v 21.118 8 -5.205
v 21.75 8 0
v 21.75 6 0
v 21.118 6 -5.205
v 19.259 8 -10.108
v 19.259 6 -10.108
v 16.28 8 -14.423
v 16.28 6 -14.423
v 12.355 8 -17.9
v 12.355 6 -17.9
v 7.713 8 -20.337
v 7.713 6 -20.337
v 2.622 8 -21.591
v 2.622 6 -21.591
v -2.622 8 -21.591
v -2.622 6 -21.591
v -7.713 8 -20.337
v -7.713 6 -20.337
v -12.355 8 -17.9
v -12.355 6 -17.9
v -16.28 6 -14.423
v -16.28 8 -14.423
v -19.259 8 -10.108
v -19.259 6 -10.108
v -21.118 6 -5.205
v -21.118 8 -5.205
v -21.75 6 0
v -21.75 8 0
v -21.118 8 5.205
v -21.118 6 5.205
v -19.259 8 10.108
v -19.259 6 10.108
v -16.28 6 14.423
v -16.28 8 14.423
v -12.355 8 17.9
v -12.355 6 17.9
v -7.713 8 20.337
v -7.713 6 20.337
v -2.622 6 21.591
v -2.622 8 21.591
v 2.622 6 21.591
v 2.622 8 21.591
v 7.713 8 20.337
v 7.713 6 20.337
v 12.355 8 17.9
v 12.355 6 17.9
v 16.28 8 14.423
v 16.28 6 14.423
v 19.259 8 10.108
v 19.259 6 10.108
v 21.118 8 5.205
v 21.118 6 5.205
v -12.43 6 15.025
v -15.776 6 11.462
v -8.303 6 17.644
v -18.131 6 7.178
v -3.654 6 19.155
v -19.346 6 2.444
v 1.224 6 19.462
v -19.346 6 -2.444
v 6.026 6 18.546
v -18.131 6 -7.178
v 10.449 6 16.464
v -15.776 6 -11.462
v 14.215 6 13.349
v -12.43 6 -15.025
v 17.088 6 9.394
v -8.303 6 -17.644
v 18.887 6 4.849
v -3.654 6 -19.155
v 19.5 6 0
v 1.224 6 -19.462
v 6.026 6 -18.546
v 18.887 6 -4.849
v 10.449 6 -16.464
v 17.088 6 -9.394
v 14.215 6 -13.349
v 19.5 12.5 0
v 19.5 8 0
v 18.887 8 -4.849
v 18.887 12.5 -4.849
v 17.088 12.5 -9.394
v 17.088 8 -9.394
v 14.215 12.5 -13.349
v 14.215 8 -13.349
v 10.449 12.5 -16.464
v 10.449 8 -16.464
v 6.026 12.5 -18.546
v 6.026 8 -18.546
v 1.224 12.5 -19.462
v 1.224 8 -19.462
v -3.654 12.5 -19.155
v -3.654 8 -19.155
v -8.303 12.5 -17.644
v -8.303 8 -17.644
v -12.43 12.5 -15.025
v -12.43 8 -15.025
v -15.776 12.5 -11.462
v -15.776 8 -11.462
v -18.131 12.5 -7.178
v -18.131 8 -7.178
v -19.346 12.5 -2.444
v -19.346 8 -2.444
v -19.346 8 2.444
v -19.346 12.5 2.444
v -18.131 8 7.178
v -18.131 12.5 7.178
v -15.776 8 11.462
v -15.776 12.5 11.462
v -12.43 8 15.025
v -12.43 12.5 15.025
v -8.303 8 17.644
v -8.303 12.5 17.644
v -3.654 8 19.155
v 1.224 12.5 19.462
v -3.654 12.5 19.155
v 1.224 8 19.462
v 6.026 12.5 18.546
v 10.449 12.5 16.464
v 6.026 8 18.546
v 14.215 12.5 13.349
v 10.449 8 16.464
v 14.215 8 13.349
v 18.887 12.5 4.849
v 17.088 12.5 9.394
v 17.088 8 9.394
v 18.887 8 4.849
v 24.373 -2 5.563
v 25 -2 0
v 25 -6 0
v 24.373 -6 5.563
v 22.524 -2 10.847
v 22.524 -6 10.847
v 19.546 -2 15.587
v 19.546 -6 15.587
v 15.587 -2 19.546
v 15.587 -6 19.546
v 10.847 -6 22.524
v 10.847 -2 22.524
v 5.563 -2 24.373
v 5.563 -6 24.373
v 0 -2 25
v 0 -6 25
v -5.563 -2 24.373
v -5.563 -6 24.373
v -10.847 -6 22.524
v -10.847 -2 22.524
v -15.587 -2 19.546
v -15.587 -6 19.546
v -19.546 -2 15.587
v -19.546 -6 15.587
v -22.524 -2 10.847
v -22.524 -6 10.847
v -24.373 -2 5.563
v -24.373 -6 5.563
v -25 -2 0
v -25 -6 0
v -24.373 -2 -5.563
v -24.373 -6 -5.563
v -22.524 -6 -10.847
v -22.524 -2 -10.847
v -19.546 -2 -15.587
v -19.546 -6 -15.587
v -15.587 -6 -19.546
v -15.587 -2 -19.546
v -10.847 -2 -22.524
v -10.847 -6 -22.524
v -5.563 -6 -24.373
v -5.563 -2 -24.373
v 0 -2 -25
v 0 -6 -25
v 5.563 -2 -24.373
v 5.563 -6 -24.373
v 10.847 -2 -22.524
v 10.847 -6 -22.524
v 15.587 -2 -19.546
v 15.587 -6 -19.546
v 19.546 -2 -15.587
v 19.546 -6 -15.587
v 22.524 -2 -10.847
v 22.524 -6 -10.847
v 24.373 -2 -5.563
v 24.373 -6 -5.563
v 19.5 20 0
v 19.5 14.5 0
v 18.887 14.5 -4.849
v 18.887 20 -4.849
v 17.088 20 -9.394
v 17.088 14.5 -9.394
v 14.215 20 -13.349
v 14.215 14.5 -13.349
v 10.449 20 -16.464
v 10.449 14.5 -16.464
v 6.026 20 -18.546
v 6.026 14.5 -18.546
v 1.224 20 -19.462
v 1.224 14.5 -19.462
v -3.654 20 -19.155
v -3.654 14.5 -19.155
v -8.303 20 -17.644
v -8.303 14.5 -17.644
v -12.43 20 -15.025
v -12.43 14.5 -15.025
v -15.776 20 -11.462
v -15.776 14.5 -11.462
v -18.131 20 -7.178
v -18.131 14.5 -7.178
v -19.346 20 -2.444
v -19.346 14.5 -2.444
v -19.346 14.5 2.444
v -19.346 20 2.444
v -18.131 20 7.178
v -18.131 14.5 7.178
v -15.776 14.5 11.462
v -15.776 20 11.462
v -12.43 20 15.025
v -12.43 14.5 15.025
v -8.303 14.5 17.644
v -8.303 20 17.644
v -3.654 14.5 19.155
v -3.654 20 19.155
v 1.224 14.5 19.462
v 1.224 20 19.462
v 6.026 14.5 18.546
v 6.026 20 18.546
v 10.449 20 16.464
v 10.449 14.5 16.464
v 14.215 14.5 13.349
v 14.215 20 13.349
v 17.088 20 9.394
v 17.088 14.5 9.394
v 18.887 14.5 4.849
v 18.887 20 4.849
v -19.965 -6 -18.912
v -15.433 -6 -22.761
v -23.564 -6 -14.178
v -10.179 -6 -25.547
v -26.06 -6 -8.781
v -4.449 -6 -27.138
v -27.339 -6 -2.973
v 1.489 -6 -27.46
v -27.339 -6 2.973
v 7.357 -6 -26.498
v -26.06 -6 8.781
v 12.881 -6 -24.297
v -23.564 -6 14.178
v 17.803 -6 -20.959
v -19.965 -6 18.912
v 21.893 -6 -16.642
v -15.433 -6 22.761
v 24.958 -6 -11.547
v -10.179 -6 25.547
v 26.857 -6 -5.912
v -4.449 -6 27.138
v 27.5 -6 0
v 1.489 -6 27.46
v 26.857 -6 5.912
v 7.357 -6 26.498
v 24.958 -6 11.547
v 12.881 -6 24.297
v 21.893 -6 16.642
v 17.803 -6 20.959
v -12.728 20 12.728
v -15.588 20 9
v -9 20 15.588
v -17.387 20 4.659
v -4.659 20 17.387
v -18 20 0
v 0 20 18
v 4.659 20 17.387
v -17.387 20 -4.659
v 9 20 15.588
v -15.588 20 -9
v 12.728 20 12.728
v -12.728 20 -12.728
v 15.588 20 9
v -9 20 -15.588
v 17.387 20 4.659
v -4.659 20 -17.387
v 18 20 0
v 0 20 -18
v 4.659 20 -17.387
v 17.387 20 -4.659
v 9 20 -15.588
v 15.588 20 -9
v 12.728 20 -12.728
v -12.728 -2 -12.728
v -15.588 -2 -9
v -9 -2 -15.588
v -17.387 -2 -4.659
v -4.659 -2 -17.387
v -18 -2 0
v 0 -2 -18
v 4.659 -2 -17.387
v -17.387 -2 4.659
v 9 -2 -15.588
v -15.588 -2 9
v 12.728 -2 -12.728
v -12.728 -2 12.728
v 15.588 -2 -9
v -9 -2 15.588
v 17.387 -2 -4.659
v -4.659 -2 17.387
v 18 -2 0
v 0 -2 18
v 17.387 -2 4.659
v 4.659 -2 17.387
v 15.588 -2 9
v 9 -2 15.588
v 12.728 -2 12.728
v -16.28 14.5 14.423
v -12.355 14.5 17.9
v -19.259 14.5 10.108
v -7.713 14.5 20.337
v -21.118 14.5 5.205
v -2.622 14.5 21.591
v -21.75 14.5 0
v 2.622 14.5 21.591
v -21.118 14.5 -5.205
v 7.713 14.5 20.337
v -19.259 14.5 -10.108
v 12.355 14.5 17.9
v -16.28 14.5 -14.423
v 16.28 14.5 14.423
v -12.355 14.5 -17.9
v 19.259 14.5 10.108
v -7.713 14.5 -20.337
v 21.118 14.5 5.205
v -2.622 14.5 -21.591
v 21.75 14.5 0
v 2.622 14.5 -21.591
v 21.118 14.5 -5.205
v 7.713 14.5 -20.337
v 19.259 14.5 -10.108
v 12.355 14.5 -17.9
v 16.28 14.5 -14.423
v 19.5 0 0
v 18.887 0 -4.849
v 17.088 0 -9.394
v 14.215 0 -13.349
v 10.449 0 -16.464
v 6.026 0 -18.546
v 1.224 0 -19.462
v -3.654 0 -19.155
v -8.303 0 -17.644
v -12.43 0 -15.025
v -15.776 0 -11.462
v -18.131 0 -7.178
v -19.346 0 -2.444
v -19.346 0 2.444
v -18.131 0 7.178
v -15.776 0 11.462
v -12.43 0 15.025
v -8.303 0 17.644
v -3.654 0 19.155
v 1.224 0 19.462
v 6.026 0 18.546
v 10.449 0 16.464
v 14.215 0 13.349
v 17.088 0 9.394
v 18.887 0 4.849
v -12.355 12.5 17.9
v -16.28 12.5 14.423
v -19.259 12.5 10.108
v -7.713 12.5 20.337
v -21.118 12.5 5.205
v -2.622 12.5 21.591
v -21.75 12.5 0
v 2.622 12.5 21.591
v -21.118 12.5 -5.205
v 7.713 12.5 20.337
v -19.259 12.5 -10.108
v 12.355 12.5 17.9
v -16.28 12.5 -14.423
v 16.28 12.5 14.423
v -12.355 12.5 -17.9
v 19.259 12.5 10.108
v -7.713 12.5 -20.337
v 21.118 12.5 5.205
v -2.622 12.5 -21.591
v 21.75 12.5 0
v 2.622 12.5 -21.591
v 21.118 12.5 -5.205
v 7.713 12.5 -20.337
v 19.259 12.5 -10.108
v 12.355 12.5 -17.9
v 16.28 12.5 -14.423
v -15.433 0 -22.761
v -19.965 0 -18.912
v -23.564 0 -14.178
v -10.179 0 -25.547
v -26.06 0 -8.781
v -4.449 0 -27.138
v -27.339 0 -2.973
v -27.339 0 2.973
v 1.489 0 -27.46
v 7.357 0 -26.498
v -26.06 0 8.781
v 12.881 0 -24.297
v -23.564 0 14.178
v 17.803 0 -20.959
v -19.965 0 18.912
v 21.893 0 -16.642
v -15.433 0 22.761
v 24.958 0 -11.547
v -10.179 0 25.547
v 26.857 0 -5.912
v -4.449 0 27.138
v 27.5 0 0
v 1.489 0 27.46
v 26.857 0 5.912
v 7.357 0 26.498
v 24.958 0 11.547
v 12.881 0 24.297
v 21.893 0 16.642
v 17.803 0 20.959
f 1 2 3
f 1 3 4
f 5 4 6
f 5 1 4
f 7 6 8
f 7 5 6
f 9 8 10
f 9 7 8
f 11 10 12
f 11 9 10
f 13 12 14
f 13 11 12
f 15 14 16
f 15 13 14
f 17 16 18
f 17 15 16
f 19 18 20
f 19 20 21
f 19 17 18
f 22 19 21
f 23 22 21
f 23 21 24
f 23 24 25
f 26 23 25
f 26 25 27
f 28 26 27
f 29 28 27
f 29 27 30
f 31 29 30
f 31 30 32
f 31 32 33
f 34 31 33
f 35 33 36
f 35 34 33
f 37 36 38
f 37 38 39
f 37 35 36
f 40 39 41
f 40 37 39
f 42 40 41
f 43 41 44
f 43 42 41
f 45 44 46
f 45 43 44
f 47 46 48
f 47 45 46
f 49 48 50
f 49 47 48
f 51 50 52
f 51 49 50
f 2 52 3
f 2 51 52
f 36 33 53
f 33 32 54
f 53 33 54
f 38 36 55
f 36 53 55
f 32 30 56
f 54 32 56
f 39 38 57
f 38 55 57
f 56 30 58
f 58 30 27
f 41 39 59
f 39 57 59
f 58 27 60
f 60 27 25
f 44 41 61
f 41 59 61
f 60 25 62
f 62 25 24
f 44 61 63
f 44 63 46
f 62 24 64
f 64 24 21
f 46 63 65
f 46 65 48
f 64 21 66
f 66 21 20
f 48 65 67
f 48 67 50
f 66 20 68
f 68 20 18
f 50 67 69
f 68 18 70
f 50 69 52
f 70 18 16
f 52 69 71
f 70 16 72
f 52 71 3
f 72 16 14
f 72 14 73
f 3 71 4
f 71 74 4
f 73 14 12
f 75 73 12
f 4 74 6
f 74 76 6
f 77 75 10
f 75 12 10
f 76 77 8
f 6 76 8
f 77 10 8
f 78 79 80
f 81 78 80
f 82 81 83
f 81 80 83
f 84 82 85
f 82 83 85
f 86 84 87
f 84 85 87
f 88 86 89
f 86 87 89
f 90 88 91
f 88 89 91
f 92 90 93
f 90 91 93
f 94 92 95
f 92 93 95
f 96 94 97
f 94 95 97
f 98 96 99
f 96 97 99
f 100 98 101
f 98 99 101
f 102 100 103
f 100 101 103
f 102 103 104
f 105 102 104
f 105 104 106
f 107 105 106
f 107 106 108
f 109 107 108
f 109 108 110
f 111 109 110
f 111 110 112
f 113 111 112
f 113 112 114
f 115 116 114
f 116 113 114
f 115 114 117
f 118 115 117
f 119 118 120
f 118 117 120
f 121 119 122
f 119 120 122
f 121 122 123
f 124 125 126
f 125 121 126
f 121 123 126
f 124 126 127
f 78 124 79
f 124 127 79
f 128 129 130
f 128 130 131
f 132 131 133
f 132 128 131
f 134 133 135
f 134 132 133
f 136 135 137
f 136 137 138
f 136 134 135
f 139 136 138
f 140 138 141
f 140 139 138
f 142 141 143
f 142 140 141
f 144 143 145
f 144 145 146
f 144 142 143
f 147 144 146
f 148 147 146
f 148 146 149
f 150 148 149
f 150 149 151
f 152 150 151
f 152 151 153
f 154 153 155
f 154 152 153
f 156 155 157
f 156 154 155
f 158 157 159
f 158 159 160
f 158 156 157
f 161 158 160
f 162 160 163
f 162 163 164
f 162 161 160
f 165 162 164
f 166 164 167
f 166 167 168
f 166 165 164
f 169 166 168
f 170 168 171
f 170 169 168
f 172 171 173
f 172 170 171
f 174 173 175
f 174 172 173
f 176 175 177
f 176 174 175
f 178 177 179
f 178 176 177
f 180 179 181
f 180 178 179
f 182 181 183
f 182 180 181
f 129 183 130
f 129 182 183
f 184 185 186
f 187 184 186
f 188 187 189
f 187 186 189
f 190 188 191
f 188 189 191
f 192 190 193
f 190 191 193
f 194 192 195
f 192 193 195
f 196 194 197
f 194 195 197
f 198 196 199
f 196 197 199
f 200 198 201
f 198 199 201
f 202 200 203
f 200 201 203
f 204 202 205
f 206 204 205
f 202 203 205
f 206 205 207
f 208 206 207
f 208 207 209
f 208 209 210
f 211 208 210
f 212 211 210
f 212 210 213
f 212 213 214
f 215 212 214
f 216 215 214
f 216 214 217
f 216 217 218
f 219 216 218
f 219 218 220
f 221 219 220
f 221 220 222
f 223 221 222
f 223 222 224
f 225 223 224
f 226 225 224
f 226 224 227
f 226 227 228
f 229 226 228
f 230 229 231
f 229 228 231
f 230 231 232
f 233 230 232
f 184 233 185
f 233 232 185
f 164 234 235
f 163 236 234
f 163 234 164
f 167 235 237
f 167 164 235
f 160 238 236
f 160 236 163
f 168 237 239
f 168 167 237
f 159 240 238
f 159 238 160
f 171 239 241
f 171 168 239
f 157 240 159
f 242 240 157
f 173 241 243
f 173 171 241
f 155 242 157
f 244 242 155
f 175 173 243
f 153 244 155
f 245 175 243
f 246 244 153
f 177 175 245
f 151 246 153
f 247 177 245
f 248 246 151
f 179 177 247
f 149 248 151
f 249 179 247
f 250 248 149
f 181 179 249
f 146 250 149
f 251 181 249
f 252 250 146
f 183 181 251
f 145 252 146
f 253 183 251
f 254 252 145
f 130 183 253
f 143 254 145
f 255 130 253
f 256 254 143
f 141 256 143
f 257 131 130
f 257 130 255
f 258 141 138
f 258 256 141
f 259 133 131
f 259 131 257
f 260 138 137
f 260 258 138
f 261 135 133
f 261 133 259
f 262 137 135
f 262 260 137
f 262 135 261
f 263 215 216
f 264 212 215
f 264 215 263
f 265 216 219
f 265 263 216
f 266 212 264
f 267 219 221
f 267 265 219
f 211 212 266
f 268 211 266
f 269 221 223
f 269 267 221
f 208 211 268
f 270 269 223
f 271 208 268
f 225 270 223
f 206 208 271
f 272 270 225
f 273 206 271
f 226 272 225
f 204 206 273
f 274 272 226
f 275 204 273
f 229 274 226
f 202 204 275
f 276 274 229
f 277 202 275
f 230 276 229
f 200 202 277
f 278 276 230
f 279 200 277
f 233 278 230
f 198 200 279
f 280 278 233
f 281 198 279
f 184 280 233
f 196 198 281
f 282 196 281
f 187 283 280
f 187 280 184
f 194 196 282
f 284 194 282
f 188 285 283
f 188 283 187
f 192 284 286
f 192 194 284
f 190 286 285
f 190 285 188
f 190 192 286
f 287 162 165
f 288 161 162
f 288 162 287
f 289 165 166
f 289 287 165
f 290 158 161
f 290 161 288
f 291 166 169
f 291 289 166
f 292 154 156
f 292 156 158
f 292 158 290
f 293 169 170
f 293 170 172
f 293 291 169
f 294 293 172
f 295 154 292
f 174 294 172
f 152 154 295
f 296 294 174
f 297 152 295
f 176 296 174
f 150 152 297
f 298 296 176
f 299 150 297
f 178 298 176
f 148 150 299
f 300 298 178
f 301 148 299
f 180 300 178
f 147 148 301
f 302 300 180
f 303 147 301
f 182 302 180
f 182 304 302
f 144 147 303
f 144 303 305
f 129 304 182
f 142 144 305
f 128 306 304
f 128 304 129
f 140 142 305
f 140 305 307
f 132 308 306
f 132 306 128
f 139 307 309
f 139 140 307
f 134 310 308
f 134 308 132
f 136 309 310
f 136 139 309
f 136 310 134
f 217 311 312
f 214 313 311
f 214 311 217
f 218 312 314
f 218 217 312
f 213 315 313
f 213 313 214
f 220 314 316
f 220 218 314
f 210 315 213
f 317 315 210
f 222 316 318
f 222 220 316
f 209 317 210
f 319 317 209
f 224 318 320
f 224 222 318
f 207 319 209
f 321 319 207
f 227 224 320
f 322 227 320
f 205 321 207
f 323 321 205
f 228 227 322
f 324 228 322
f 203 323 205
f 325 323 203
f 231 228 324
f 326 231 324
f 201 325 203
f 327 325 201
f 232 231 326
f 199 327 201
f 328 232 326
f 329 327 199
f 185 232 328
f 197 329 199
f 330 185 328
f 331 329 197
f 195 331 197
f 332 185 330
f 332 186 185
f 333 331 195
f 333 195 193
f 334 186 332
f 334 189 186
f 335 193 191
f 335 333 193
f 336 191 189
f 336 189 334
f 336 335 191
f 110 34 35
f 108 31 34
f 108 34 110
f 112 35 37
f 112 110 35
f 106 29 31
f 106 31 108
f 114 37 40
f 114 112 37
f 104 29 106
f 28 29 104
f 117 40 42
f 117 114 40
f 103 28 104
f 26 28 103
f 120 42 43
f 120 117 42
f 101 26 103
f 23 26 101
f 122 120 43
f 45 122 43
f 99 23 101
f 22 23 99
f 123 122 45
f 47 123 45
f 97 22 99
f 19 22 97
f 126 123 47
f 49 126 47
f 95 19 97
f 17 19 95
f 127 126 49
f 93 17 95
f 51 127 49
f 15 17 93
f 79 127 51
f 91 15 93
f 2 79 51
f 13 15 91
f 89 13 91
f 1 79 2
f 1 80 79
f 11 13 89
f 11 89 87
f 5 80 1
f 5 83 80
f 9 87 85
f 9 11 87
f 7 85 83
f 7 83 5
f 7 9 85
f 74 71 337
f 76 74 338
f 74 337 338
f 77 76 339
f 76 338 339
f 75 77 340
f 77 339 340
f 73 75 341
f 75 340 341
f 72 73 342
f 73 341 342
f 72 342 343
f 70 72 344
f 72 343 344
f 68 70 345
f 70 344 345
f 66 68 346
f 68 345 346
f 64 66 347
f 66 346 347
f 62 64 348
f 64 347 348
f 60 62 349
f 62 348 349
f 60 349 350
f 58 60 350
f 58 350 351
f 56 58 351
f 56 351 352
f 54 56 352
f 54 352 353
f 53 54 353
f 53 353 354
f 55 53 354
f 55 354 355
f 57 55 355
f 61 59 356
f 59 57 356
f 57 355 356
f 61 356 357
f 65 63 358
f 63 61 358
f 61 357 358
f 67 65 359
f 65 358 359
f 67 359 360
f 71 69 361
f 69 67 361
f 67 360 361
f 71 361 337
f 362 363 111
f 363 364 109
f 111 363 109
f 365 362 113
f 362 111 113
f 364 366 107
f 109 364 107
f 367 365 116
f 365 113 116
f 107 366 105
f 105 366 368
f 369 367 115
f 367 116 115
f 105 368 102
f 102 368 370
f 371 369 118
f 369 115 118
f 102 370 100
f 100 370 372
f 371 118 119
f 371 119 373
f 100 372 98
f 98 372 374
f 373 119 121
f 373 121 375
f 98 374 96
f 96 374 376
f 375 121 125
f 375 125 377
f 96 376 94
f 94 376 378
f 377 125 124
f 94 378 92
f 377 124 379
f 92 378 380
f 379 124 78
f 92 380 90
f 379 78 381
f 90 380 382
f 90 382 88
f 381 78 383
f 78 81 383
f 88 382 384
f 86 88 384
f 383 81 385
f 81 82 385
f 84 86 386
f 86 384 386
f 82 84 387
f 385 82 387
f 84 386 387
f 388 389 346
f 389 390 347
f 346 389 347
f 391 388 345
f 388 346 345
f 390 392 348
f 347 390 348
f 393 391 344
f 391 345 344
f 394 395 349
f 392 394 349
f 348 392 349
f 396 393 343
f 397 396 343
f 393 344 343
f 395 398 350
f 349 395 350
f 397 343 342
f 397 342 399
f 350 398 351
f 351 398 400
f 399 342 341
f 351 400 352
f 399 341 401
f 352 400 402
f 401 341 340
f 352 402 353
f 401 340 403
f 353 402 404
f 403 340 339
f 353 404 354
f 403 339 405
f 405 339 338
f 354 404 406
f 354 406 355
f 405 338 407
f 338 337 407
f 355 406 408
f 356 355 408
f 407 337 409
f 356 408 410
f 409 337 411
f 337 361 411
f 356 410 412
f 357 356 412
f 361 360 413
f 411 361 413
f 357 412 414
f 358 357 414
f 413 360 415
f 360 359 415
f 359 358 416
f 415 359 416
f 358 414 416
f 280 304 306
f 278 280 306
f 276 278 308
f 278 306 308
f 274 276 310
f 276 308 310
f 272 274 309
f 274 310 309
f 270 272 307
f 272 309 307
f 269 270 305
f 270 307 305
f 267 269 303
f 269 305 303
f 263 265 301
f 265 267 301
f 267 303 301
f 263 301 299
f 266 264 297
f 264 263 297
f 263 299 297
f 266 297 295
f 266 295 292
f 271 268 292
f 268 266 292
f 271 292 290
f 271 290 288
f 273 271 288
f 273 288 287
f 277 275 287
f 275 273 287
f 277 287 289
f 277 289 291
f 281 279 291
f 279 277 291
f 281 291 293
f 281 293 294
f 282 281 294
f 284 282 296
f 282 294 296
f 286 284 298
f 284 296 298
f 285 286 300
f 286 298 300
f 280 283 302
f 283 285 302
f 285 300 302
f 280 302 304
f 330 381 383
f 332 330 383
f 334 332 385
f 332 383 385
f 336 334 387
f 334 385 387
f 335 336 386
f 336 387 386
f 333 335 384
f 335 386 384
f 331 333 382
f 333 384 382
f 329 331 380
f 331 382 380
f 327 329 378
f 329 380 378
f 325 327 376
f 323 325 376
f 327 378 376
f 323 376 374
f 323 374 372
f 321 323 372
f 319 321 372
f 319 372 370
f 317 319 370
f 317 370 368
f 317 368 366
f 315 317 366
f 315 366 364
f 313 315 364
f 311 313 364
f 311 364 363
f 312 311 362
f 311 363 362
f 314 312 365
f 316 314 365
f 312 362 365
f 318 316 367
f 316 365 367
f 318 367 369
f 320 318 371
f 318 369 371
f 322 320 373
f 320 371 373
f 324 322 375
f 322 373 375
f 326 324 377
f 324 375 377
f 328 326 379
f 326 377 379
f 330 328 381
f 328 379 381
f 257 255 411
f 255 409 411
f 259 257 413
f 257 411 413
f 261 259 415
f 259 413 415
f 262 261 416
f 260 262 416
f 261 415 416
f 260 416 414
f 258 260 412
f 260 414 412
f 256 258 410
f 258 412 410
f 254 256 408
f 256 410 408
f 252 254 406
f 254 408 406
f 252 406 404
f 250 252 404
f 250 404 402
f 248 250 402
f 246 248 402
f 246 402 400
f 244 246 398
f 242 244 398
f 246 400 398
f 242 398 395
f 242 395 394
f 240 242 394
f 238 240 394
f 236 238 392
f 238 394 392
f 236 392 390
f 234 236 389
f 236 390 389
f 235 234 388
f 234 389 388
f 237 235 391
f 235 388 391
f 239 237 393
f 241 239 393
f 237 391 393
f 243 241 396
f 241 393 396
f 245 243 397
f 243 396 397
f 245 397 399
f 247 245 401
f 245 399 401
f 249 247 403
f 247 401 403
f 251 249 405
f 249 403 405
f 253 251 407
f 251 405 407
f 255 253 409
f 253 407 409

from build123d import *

# Parameters (mm, degrees)
SKETCH_1_R          = 19.5
SKETCH_1_R_2        = 18
EXTRUDE_1_DEPTH     = 20
SKETCH_3_R          = 27.5
EXTRUDE_2_DEPTH     = 2
SKETCH_4_R          = 21.75
EXTRUDE_3_DEPTH     = 2
EXTRUDE_START       = 3
SKETCH_8_R          = 21.75
EXTRUDE_4_DEPTH     = 2
SKETCH_6_R          = 18
CUT_EXTRUDE_1_DEPTH = 35
SKETCH_13_R         = 27.5
SKETCH_13_R_2       = 25
EXTRUDE_6_DEPTH     = 4
SKETCH_13_4_R       = 18
CUT_EXTRUDE_2_DEPTH = 23.5


with BuildPart() as part:
    # 草圖1 → 填料-伸長1 (new body)
    with BuildSketch(Plane(origin=(0, 0, 0), x_dir=(1, 0, 0), z_dir=(0, 1, 0))):
        Circle(SKETCH_1_R)
        Circle(SKETCH_1_R_2, mode=Mode.SUBTRACT)
    extrude(amount=EXTRUDE_1_DEPTH)

    # 草圖3 → 填料-伸長2 (add)
    with BuildSketch(Plane.XZ):
        Circle(SKETCH_3_R)
    extrude(amount=EXTRUDE_2_DEPTH)

    # 草圖4 → 填料-伸長3 (add)
    with BuildSketch(Plane(origin=(0, 8, 0), x_dir=(1, 0, 0), z_dir=(0, 1, 0))):
        Circle(SKETCH_4_R)
    extrude(amount=-EXTRUDE_3_DEPTH)

    # 草圖8 → 填料-伸長4 (add)
    with BuildSketch(Plane(origin=(0, 11.5, 0), x_dir=(1, 0, 0), z_dir=(0, 1, 0)).offset(EXTRUDE_START)):
        Circle(SKETCH_8_R)
    extrude(amount=-EXTRUDE_4_DEPTH)

    # 草圖6 → 除料-伸長1 (cut)
    with BuildSketch(Plane(origin=(0, 0, 0), x_dir=(1, 0, 0), z_dir=(0, 1, 0))):
        Circle(SKETCH_6_R)
    extrude(amount=CUT_EXTRUDE_1_DEPTH, mode=Mode.SUBTRACT)

    # 草圖13 → 填料-伸長6 (add)
    with BuildSketch(Plane.XZ.offset(2)):
        Circle(SKETCH_13_R)
        Circle(SKETCH_13_R_2, mode=Mode.SUBTRACT)
    extrude(amount=EXTRUDE_6_DEPTH)

    # 草圖13<4> → 除料-伸長2 (cut)
    with BuildSketch(Plane.XZ.offset(2)):
        Circle(SKETCH_13_4_R)
    extrude(amount=-CUT_EXTRUDE_2_DEPTH, mode=Mode.SUBTRACT)


solid = part.part
